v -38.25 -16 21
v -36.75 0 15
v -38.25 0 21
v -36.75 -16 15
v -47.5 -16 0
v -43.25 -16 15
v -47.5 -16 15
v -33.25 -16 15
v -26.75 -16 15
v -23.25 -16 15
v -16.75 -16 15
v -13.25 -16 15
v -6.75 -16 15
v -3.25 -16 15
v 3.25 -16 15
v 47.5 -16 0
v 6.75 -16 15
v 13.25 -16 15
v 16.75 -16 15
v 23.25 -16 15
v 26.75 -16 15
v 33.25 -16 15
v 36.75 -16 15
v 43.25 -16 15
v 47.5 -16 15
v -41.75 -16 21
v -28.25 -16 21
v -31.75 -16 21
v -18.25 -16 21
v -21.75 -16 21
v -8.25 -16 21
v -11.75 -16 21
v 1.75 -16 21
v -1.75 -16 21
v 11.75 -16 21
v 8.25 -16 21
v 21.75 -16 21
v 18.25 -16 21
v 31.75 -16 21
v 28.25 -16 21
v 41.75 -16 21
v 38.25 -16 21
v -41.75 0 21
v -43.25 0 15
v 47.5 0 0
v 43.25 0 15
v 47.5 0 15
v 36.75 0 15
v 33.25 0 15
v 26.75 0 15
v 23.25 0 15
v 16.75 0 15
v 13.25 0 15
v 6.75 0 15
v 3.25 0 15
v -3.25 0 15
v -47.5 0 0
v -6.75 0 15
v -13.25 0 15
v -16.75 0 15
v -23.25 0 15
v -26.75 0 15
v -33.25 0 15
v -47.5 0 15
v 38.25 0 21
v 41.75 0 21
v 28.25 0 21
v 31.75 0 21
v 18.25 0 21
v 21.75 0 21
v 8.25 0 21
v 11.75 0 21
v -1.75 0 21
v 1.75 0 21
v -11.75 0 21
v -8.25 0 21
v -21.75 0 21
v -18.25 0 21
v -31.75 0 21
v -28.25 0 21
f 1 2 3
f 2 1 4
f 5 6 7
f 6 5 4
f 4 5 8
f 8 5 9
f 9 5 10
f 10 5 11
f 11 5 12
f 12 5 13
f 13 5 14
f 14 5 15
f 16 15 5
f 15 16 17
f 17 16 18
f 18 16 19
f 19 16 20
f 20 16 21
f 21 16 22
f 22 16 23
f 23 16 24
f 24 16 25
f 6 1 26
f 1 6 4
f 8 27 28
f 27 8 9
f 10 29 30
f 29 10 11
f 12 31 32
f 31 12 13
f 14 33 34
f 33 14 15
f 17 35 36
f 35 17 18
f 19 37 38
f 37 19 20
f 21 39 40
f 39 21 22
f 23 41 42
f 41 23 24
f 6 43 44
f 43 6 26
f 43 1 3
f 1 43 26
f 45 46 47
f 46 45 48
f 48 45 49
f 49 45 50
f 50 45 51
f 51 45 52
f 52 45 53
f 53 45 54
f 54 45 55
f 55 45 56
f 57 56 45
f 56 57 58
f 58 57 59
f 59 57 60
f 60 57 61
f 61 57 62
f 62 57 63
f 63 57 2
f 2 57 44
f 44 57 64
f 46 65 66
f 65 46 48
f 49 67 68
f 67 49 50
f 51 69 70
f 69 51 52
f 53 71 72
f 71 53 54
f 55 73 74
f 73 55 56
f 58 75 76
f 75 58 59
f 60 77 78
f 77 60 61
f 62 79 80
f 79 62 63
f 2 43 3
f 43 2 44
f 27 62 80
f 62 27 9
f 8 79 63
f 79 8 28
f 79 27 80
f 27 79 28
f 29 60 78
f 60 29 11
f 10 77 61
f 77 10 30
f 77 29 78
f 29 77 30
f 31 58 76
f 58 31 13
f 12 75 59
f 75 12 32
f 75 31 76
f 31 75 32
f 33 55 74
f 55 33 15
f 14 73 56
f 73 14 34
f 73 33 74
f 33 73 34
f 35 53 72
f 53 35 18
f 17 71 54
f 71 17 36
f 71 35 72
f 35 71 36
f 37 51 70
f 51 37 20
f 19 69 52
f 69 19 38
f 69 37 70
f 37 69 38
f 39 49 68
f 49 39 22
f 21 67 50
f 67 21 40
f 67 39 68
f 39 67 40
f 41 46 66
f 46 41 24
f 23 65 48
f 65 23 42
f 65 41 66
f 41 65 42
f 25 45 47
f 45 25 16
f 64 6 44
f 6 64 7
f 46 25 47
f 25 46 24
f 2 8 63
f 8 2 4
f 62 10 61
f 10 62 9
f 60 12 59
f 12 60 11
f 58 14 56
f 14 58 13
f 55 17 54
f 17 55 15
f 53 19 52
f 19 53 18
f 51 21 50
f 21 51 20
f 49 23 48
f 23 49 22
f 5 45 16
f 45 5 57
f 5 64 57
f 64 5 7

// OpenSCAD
$fn = 32;

// ----------------------------------------------------------------------
// Toothed rack, 9 teeth
// 10 mm pitch, 6 mm teeth
// ----------------------------------------------------------------------

// --- parameters (mm) ---
bar_w = 16;     // bar width (Y)
bar_h = 15;     // bar height (Z)
teeth = 9;      // number of teeth
pitch = 10;     // tooth pitch
tooth_h = 6;    // tooth height above the bar
root_w = 7;     // tooth width at the root
crest_w = 3.5;  // tooth width at the crest

// --- derived feature positions (mm) ---
span = (teeth - 1) * pitch;  // = 80   distance between the outer teeth
bar_l = span + root_w + 8;   // = 95   bar length: teeth plus 4 mm at each end
tooth_x = -span / 2;         // = -40   X of the first tooth
height = bar_h + tooth_h;    // = 21   overall height
feature_centers = [
  [tooth_x + 0 * pitch, -bar_w / 2],
  [tooth_x + 1 * pitch, -bar_w / 2],
  [tooth_x + 2 * pitch, -bar_w / 2],
  [tooth_x + 3 * pitch, -bar_w / 2],
  [tooth_x + 4 * pitch, -bar_w / 2],
  [tooth_x + 5 * pitch, -bar_w / 2],
  [tooth_x + 6 * pitch, -bar_w / 2],
  [tooth_x + 7 * pitch, -bar_w / 2],
  [tooth_x + 8 * pitch, -bar_w / 2]
];   // tooth centre line, drives the tooth loop

// bar with a rack of teeth, one extruded trapezoium per centre
module rack_tooth() {
  linear_extrude(height = bar_w)
    polygon(points = [
      [0, 0],
      [root_w, 0],
      [root_w / 2 + crest_w / 2, tooth_h + 1],
      [root_w / 2 - crest_w / 2, tooth_h + 1]
    ]);
}

union() {
  translate([-bar_l / 2, -bar_w, 0]) cube([bar_l, bar_w, bar_h]);
  for (centre = feature_centers)
    translate([centre[0] - root_w / 2, 0, bar_h - 1]) rotate([90, 0, 0]) rack_tooth();
}
